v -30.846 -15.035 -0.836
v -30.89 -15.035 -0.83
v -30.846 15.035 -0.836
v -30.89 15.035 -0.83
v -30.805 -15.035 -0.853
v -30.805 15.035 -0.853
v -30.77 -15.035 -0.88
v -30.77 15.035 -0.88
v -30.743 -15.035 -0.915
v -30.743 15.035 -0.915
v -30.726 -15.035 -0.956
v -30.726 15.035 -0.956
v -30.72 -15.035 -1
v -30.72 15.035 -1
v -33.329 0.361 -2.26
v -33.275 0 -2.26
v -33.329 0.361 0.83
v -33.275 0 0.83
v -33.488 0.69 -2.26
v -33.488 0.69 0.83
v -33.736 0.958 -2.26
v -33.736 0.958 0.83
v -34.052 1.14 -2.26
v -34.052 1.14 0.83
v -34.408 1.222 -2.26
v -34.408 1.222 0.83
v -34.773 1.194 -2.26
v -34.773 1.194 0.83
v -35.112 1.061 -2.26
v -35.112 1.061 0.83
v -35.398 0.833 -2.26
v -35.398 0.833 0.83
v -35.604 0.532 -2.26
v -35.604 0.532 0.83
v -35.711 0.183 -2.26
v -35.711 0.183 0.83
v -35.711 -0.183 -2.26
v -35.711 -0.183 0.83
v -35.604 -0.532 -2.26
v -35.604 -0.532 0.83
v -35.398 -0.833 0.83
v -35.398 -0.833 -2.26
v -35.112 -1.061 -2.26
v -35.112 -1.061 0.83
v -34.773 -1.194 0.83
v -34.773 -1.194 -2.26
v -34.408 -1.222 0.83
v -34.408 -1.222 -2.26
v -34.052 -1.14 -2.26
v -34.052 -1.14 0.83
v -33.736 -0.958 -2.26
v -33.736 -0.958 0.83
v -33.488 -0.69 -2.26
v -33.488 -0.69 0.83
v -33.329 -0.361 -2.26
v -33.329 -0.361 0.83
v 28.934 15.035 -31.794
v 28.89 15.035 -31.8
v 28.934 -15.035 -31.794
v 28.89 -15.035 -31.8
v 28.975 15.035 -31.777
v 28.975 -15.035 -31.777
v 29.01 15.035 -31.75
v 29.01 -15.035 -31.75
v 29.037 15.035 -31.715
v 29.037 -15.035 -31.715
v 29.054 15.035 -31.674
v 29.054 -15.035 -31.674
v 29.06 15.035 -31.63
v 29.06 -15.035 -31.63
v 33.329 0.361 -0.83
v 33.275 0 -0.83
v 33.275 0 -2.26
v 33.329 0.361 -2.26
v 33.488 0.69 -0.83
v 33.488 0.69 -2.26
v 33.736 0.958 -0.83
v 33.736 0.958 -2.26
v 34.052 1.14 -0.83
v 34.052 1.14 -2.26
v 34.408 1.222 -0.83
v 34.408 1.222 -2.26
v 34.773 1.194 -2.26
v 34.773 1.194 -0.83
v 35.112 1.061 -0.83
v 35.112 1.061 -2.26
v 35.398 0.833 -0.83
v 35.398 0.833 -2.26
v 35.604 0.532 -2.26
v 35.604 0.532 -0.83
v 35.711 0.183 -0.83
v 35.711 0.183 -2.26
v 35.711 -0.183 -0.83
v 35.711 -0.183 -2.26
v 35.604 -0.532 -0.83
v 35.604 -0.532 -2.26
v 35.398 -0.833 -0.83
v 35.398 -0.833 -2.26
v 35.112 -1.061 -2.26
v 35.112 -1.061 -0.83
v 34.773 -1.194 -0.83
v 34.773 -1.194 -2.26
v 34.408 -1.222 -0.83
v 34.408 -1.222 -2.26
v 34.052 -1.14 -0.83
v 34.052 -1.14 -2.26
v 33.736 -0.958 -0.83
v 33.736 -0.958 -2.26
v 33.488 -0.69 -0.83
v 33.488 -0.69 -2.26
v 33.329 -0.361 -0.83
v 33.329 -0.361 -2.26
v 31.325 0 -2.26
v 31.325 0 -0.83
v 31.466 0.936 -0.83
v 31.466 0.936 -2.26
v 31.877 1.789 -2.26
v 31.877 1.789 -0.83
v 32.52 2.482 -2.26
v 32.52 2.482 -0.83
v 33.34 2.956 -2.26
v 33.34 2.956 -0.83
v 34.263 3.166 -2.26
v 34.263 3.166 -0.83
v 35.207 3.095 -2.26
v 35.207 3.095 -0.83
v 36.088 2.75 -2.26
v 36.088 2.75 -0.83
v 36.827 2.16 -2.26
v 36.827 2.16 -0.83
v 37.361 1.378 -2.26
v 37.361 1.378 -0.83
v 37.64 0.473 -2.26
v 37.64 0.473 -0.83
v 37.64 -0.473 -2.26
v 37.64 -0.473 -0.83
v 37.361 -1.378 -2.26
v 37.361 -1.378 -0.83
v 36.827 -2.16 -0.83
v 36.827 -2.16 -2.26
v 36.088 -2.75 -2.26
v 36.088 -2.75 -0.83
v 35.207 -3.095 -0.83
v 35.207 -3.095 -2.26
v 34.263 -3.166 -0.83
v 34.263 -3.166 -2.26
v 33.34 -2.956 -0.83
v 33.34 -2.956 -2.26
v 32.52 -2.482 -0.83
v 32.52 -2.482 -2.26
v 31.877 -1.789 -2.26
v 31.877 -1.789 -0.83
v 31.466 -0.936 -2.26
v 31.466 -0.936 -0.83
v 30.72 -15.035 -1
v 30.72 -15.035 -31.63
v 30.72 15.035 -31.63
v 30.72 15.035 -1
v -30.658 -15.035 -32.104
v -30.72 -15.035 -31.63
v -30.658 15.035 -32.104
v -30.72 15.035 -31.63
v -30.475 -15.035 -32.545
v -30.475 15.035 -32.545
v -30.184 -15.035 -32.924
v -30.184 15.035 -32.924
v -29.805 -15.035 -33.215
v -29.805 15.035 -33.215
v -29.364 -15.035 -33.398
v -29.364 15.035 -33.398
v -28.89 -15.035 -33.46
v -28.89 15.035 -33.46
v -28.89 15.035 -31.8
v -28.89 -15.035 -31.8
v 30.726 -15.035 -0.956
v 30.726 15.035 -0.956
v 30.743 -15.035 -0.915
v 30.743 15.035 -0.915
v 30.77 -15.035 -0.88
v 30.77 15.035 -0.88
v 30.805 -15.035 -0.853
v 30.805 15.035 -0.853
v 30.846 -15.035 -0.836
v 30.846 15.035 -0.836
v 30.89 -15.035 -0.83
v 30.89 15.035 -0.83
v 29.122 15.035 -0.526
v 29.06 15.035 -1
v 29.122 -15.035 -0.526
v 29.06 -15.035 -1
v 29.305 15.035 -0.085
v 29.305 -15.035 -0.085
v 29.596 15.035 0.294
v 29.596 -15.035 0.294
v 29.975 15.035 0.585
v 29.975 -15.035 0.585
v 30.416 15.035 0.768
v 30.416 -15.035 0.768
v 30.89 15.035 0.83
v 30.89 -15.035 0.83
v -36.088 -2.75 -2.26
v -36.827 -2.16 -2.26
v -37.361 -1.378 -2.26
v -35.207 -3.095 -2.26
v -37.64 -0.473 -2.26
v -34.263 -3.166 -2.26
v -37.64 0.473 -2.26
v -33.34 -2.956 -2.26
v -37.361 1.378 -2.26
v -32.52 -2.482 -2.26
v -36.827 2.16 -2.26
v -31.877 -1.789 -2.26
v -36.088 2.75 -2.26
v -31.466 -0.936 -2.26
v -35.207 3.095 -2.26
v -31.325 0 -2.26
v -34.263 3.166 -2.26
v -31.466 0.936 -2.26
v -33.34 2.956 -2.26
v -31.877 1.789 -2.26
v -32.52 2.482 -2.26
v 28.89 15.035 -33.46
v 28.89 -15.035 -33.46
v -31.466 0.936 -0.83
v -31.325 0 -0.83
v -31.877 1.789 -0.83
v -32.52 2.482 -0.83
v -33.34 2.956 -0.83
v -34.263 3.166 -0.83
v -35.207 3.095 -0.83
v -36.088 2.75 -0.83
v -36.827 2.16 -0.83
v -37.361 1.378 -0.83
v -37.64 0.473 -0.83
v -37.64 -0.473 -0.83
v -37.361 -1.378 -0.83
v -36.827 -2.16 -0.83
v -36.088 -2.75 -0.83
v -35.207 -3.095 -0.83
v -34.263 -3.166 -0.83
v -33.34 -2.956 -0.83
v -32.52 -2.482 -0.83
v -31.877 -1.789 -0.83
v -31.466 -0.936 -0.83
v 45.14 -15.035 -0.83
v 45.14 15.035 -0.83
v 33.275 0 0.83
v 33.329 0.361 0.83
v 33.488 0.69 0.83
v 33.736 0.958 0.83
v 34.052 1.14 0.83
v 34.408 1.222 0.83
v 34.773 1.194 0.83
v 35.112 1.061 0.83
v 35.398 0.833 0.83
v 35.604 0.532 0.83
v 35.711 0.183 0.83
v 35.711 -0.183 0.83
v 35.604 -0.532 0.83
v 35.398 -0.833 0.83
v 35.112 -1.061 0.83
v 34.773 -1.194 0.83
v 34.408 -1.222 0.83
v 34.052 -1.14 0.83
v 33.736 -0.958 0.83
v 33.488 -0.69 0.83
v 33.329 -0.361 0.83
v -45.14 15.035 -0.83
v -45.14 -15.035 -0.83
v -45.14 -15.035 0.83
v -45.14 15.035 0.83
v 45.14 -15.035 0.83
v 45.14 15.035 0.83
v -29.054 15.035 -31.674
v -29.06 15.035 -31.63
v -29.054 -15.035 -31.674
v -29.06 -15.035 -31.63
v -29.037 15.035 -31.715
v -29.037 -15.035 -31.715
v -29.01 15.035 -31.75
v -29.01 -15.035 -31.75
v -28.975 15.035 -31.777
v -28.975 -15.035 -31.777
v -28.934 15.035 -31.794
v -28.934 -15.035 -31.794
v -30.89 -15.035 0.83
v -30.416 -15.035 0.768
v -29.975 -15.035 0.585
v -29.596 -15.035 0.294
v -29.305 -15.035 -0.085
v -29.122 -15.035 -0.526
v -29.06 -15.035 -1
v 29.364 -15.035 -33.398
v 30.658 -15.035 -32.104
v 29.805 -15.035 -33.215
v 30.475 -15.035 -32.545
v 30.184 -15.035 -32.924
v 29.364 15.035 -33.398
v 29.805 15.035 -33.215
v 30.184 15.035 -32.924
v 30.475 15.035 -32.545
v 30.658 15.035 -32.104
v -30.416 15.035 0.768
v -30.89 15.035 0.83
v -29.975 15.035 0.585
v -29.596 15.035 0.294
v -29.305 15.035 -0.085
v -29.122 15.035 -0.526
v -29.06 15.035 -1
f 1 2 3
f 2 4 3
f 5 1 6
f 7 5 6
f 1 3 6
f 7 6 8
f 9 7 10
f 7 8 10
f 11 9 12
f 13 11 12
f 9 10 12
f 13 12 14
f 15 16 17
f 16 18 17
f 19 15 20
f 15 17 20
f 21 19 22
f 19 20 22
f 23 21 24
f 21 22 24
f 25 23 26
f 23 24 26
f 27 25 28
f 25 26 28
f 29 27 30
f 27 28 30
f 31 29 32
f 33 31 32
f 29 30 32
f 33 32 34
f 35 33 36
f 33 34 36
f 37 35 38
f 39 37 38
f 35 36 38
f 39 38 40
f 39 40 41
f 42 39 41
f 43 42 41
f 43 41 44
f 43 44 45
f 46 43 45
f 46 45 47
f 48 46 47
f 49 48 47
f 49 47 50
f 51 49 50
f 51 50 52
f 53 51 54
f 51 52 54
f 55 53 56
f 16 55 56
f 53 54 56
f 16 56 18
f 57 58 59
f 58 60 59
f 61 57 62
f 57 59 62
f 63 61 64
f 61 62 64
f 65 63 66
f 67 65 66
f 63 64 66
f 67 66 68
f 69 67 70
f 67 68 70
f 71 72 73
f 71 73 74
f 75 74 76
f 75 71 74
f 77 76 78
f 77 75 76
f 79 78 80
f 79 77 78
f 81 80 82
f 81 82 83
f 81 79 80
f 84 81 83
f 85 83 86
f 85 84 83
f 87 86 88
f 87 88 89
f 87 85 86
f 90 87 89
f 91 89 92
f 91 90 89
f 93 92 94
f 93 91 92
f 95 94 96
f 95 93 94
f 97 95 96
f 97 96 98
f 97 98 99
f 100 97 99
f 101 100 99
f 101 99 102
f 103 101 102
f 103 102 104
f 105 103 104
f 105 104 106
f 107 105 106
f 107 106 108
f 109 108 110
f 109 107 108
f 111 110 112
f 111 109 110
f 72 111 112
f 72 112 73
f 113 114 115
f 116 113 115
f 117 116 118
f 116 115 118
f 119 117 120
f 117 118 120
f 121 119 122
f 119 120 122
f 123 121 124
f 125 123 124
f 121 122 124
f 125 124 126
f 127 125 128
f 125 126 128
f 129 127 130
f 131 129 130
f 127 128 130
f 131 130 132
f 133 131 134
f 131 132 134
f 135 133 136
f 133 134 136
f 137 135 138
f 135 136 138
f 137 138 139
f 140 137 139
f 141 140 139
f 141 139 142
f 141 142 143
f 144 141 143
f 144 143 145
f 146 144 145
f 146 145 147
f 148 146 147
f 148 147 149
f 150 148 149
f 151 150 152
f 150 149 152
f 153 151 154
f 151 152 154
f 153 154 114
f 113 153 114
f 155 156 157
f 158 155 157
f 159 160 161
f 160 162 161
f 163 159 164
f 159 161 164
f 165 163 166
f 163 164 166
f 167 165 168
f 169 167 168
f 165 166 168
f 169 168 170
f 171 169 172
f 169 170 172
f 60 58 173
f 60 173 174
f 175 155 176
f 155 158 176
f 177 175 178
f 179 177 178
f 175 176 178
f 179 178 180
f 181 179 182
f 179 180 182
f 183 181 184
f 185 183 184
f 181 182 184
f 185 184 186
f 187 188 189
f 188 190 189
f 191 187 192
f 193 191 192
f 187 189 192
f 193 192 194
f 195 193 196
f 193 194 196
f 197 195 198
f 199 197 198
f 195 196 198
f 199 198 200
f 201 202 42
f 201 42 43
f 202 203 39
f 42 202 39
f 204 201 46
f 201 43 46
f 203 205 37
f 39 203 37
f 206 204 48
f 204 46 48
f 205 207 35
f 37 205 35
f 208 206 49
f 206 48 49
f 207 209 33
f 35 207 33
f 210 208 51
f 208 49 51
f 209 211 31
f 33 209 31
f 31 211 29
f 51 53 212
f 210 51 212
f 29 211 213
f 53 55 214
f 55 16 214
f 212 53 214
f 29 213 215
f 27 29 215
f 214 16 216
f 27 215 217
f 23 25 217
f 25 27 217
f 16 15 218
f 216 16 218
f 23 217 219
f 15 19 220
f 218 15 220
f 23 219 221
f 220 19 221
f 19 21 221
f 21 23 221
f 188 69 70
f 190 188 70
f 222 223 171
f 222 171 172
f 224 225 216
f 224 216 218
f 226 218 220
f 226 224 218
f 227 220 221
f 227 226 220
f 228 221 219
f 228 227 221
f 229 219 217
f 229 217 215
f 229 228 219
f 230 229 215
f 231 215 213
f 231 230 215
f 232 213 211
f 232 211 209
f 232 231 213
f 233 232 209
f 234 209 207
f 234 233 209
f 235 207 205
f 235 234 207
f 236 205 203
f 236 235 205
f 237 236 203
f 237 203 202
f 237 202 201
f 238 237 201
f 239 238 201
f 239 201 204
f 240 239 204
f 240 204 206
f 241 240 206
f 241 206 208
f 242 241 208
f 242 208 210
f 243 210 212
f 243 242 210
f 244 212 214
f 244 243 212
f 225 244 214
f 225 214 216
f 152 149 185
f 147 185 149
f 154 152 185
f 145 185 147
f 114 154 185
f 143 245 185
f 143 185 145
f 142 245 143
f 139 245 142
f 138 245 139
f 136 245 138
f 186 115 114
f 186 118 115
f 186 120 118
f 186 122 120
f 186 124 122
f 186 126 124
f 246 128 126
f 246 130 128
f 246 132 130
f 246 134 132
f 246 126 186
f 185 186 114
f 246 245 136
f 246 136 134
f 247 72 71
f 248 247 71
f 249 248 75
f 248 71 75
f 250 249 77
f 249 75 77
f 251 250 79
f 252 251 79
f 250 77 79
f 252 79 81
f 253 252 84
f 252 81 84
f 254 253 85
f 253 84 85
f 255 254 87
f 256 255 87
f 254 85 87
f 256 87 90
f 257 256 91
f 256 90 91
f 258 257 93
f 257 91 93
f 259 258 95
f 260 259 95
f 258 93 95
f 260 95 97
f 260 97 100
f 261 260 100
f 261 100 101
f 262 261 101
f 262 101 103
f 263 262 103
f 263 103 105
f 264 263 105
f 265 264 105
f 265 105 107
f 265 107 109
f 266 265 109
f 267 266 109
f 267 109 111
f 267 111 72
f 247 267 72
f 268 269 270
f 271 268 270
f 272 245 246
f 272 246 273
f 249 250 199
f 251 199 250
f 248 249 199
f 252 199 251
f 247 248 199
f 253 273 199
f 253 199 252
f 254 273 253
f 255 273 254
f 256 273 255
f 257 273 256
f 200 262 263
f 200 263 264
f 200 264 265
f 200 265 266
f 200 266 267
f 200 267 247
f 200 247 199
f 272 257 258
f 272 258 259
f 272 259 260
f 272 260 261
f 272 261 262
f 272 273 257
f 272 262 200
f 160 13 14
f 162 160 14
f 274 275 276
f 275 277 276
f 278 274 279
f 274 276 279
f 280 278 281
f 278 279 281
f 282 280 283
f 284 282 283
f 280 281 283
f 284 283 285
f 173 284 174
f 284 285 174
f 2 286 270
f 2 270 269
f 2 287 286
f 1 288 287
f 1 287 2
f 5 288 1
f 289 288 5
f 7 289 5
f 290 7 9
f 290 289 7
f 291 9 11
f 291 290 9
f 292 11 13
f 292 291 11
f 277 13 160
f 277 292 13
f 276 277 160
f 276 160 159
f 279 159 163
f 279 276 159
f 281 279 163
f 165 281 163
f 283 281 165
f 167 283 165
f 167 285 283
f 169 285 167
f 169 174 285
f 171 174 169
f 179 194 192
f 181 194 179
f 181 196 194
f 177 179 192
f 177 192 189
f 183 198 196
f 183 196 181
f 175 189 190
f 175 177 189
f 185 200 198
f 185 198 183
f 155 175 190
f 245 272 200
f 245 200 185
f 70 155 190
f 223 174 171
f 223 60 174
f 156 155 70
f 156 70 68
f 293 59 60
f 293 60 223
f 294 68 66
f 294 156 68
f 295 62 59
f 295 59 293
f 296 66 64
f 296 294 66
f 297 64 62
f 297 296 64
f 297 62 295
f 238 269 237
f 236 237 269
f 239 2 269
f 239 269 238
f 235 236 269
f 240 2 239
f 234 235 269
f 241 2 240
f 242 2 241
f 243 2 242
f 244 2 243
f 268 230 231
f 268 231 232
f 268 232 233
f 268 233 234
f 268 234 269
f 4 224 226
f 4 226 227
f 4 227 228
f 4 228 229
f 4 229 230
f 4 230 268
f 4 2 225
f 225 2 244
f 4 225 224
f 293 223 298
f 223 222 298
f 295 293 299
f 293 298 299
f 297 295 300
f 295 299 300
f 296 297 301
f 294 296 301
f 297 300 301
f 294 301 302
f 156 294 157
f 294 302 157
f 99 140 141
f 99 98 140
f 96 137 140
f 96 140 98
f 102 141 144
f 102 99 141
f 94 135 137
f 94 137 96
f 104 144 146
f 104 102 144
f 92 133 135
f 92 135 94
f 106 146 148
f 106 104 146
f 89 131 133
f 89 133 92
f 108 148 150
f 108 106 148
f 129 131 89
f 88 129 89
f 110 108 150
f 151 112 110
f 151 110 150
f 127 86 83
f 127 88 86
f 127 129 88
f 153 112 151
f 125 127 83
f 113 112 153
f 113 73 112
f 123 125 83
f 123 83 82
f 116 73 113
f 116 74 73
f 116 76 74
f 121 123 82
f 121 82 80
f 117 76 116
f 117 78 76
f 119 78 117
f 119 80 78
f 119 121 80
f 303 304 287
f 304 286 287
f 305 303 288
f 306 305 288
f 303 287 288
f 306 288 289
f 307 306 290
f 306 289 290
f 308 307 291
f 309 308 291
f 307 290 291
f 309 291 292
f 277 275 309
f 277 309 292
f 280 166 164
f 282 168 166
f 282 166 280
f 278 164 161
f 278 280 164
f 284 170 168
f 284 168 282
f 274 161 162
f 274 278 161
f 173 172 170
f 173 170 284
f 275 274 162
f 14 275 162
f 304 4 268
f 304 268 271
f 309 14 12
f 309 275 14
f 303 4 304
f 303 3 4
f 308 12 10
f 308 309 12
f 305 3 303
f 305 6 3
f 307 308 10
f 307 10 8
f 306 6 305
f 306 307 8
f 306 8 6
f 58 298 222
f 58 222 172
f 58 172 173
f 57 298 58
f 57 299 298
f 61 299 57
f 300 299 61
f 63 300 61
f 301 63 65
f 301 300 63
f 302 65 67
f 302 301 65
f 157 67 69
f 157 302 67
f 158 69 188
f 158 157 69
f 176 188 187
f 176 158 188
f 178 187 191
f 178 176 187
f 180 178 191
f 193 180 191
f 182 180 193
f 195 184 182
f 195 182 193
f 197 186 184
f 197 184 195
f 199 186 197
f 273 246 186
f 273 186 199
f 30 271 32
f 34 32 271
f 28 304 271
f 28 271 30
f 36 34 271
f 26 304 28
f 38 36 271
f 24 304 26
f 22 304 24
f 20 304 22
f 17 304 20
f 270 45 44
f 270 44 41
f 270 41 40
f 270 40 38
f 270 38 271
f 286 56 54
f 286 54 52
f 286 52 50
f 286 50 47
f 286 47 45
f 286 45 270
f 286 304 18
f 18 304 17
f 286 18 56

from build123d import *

# Parameters (mm, degrees)
SKETCH2_W           = 1.66
SKETCH2_H           = 30.07
SKETCH3_R           = 1.225
CUT_EXTRUDE1_DEPTH  = 58.692180796
BOSS_EXTRUDE1_START = 1.43
SKETCH3_3_R         = 3.175
SKETCH3_3_R_2       = 1.225
BOSS_EXTRUDE1_DEPTH = 1.43


with BuildPart() as part:
    # Sweep1: sweep along a path in Sketch1
    with BuildLine(Plane(origin=(0, 0, 0), x_dir=(1, 0, 0), z_dir=(0, 1, 0))) as sweep1_path:
        Line((-45.14, 0), (-30.89, 0))
        ThreePointArc((-30.89, 0), (-30.182893219, 0.292893219), (-29.89, 1))
        Line((-29.89, 1), (-29.89, 31.63))
        ThreePointArc((-29.89, 31.63), (-29.597106781, 32.337106781), (-28.89, 32.63))
        Line((-28.89, 32.63), (28.89, 32.63))
        ThreePointArc((28.89, 32.63), (29.597106781, 32.337106781), (29.89, 31.63))
        Line((29.89, 31.63), (29.89, 1))
        ThreePointArc((29.89, 1), (30.182893219, 0.292893219), (30.89, 0))
        Line((30.89, 0), (45.14, 0))
    # Sketch2 → Sweep1 (sweep)
    with BuildSketch(Plane(origin=(45.14, 0, 0), x_dir=(0, 0, -1), z_dir=(1, 0, 0))):
        Rectangle(SKETCH2_W, SKETCH2_H)
    sweep(path=sweep1_path.line)

    # Sketch3 → Cut-Extrude1 (cut, through all)
    with BuildSketch(Plane(origin=(0, 0, -0.83), x_dir=(-1, 0, 0), z_dir=(0, 0, -1))):
        with Locations((-34.5, 0)):
            Circle(SKETCH3_R)
    cut_extrude1 = extrude(amount=-CUT_EXTRUDE1_DEPTH, mode=Mode.SUBTRACT)

    # Sketch3<3> → Boss-Extrude1 (add)
    with BuildSketch(Plane(origin=(0, 0, -0.83), x_dir=(-1, 0, 0), z_dir=(0, 0, -1)).offset(BOSS_EXTRUDE1_START)):
        with Locations((-34.5, 0)):
            Circle(SKETCH3_3_R)
        with Locations((-34.5, 0)):
            Circle(SKETCH3_3_R_2, mode=Mode.SUBTRACT)
    boss_extrude1 = extrude(amount=-BOSS_EXTRUDE1_DEPTH)

    # Mirror1: Cut-Extrude1, Boss-Extrude1 across plane
    add(cut_extrude1.mirror(Plane(origin=(0, 0, 0), x_dir=(0, 0, 1), z_dir=(1, 0, 0))), mode=Mode.SUBTRACT)
    add(boss_extrude1.mirror(Plane(origin=(0, 0, 0), x_dir=(0, 0, 1), z_dir=(1, 0, 0))))


solid = part.part
